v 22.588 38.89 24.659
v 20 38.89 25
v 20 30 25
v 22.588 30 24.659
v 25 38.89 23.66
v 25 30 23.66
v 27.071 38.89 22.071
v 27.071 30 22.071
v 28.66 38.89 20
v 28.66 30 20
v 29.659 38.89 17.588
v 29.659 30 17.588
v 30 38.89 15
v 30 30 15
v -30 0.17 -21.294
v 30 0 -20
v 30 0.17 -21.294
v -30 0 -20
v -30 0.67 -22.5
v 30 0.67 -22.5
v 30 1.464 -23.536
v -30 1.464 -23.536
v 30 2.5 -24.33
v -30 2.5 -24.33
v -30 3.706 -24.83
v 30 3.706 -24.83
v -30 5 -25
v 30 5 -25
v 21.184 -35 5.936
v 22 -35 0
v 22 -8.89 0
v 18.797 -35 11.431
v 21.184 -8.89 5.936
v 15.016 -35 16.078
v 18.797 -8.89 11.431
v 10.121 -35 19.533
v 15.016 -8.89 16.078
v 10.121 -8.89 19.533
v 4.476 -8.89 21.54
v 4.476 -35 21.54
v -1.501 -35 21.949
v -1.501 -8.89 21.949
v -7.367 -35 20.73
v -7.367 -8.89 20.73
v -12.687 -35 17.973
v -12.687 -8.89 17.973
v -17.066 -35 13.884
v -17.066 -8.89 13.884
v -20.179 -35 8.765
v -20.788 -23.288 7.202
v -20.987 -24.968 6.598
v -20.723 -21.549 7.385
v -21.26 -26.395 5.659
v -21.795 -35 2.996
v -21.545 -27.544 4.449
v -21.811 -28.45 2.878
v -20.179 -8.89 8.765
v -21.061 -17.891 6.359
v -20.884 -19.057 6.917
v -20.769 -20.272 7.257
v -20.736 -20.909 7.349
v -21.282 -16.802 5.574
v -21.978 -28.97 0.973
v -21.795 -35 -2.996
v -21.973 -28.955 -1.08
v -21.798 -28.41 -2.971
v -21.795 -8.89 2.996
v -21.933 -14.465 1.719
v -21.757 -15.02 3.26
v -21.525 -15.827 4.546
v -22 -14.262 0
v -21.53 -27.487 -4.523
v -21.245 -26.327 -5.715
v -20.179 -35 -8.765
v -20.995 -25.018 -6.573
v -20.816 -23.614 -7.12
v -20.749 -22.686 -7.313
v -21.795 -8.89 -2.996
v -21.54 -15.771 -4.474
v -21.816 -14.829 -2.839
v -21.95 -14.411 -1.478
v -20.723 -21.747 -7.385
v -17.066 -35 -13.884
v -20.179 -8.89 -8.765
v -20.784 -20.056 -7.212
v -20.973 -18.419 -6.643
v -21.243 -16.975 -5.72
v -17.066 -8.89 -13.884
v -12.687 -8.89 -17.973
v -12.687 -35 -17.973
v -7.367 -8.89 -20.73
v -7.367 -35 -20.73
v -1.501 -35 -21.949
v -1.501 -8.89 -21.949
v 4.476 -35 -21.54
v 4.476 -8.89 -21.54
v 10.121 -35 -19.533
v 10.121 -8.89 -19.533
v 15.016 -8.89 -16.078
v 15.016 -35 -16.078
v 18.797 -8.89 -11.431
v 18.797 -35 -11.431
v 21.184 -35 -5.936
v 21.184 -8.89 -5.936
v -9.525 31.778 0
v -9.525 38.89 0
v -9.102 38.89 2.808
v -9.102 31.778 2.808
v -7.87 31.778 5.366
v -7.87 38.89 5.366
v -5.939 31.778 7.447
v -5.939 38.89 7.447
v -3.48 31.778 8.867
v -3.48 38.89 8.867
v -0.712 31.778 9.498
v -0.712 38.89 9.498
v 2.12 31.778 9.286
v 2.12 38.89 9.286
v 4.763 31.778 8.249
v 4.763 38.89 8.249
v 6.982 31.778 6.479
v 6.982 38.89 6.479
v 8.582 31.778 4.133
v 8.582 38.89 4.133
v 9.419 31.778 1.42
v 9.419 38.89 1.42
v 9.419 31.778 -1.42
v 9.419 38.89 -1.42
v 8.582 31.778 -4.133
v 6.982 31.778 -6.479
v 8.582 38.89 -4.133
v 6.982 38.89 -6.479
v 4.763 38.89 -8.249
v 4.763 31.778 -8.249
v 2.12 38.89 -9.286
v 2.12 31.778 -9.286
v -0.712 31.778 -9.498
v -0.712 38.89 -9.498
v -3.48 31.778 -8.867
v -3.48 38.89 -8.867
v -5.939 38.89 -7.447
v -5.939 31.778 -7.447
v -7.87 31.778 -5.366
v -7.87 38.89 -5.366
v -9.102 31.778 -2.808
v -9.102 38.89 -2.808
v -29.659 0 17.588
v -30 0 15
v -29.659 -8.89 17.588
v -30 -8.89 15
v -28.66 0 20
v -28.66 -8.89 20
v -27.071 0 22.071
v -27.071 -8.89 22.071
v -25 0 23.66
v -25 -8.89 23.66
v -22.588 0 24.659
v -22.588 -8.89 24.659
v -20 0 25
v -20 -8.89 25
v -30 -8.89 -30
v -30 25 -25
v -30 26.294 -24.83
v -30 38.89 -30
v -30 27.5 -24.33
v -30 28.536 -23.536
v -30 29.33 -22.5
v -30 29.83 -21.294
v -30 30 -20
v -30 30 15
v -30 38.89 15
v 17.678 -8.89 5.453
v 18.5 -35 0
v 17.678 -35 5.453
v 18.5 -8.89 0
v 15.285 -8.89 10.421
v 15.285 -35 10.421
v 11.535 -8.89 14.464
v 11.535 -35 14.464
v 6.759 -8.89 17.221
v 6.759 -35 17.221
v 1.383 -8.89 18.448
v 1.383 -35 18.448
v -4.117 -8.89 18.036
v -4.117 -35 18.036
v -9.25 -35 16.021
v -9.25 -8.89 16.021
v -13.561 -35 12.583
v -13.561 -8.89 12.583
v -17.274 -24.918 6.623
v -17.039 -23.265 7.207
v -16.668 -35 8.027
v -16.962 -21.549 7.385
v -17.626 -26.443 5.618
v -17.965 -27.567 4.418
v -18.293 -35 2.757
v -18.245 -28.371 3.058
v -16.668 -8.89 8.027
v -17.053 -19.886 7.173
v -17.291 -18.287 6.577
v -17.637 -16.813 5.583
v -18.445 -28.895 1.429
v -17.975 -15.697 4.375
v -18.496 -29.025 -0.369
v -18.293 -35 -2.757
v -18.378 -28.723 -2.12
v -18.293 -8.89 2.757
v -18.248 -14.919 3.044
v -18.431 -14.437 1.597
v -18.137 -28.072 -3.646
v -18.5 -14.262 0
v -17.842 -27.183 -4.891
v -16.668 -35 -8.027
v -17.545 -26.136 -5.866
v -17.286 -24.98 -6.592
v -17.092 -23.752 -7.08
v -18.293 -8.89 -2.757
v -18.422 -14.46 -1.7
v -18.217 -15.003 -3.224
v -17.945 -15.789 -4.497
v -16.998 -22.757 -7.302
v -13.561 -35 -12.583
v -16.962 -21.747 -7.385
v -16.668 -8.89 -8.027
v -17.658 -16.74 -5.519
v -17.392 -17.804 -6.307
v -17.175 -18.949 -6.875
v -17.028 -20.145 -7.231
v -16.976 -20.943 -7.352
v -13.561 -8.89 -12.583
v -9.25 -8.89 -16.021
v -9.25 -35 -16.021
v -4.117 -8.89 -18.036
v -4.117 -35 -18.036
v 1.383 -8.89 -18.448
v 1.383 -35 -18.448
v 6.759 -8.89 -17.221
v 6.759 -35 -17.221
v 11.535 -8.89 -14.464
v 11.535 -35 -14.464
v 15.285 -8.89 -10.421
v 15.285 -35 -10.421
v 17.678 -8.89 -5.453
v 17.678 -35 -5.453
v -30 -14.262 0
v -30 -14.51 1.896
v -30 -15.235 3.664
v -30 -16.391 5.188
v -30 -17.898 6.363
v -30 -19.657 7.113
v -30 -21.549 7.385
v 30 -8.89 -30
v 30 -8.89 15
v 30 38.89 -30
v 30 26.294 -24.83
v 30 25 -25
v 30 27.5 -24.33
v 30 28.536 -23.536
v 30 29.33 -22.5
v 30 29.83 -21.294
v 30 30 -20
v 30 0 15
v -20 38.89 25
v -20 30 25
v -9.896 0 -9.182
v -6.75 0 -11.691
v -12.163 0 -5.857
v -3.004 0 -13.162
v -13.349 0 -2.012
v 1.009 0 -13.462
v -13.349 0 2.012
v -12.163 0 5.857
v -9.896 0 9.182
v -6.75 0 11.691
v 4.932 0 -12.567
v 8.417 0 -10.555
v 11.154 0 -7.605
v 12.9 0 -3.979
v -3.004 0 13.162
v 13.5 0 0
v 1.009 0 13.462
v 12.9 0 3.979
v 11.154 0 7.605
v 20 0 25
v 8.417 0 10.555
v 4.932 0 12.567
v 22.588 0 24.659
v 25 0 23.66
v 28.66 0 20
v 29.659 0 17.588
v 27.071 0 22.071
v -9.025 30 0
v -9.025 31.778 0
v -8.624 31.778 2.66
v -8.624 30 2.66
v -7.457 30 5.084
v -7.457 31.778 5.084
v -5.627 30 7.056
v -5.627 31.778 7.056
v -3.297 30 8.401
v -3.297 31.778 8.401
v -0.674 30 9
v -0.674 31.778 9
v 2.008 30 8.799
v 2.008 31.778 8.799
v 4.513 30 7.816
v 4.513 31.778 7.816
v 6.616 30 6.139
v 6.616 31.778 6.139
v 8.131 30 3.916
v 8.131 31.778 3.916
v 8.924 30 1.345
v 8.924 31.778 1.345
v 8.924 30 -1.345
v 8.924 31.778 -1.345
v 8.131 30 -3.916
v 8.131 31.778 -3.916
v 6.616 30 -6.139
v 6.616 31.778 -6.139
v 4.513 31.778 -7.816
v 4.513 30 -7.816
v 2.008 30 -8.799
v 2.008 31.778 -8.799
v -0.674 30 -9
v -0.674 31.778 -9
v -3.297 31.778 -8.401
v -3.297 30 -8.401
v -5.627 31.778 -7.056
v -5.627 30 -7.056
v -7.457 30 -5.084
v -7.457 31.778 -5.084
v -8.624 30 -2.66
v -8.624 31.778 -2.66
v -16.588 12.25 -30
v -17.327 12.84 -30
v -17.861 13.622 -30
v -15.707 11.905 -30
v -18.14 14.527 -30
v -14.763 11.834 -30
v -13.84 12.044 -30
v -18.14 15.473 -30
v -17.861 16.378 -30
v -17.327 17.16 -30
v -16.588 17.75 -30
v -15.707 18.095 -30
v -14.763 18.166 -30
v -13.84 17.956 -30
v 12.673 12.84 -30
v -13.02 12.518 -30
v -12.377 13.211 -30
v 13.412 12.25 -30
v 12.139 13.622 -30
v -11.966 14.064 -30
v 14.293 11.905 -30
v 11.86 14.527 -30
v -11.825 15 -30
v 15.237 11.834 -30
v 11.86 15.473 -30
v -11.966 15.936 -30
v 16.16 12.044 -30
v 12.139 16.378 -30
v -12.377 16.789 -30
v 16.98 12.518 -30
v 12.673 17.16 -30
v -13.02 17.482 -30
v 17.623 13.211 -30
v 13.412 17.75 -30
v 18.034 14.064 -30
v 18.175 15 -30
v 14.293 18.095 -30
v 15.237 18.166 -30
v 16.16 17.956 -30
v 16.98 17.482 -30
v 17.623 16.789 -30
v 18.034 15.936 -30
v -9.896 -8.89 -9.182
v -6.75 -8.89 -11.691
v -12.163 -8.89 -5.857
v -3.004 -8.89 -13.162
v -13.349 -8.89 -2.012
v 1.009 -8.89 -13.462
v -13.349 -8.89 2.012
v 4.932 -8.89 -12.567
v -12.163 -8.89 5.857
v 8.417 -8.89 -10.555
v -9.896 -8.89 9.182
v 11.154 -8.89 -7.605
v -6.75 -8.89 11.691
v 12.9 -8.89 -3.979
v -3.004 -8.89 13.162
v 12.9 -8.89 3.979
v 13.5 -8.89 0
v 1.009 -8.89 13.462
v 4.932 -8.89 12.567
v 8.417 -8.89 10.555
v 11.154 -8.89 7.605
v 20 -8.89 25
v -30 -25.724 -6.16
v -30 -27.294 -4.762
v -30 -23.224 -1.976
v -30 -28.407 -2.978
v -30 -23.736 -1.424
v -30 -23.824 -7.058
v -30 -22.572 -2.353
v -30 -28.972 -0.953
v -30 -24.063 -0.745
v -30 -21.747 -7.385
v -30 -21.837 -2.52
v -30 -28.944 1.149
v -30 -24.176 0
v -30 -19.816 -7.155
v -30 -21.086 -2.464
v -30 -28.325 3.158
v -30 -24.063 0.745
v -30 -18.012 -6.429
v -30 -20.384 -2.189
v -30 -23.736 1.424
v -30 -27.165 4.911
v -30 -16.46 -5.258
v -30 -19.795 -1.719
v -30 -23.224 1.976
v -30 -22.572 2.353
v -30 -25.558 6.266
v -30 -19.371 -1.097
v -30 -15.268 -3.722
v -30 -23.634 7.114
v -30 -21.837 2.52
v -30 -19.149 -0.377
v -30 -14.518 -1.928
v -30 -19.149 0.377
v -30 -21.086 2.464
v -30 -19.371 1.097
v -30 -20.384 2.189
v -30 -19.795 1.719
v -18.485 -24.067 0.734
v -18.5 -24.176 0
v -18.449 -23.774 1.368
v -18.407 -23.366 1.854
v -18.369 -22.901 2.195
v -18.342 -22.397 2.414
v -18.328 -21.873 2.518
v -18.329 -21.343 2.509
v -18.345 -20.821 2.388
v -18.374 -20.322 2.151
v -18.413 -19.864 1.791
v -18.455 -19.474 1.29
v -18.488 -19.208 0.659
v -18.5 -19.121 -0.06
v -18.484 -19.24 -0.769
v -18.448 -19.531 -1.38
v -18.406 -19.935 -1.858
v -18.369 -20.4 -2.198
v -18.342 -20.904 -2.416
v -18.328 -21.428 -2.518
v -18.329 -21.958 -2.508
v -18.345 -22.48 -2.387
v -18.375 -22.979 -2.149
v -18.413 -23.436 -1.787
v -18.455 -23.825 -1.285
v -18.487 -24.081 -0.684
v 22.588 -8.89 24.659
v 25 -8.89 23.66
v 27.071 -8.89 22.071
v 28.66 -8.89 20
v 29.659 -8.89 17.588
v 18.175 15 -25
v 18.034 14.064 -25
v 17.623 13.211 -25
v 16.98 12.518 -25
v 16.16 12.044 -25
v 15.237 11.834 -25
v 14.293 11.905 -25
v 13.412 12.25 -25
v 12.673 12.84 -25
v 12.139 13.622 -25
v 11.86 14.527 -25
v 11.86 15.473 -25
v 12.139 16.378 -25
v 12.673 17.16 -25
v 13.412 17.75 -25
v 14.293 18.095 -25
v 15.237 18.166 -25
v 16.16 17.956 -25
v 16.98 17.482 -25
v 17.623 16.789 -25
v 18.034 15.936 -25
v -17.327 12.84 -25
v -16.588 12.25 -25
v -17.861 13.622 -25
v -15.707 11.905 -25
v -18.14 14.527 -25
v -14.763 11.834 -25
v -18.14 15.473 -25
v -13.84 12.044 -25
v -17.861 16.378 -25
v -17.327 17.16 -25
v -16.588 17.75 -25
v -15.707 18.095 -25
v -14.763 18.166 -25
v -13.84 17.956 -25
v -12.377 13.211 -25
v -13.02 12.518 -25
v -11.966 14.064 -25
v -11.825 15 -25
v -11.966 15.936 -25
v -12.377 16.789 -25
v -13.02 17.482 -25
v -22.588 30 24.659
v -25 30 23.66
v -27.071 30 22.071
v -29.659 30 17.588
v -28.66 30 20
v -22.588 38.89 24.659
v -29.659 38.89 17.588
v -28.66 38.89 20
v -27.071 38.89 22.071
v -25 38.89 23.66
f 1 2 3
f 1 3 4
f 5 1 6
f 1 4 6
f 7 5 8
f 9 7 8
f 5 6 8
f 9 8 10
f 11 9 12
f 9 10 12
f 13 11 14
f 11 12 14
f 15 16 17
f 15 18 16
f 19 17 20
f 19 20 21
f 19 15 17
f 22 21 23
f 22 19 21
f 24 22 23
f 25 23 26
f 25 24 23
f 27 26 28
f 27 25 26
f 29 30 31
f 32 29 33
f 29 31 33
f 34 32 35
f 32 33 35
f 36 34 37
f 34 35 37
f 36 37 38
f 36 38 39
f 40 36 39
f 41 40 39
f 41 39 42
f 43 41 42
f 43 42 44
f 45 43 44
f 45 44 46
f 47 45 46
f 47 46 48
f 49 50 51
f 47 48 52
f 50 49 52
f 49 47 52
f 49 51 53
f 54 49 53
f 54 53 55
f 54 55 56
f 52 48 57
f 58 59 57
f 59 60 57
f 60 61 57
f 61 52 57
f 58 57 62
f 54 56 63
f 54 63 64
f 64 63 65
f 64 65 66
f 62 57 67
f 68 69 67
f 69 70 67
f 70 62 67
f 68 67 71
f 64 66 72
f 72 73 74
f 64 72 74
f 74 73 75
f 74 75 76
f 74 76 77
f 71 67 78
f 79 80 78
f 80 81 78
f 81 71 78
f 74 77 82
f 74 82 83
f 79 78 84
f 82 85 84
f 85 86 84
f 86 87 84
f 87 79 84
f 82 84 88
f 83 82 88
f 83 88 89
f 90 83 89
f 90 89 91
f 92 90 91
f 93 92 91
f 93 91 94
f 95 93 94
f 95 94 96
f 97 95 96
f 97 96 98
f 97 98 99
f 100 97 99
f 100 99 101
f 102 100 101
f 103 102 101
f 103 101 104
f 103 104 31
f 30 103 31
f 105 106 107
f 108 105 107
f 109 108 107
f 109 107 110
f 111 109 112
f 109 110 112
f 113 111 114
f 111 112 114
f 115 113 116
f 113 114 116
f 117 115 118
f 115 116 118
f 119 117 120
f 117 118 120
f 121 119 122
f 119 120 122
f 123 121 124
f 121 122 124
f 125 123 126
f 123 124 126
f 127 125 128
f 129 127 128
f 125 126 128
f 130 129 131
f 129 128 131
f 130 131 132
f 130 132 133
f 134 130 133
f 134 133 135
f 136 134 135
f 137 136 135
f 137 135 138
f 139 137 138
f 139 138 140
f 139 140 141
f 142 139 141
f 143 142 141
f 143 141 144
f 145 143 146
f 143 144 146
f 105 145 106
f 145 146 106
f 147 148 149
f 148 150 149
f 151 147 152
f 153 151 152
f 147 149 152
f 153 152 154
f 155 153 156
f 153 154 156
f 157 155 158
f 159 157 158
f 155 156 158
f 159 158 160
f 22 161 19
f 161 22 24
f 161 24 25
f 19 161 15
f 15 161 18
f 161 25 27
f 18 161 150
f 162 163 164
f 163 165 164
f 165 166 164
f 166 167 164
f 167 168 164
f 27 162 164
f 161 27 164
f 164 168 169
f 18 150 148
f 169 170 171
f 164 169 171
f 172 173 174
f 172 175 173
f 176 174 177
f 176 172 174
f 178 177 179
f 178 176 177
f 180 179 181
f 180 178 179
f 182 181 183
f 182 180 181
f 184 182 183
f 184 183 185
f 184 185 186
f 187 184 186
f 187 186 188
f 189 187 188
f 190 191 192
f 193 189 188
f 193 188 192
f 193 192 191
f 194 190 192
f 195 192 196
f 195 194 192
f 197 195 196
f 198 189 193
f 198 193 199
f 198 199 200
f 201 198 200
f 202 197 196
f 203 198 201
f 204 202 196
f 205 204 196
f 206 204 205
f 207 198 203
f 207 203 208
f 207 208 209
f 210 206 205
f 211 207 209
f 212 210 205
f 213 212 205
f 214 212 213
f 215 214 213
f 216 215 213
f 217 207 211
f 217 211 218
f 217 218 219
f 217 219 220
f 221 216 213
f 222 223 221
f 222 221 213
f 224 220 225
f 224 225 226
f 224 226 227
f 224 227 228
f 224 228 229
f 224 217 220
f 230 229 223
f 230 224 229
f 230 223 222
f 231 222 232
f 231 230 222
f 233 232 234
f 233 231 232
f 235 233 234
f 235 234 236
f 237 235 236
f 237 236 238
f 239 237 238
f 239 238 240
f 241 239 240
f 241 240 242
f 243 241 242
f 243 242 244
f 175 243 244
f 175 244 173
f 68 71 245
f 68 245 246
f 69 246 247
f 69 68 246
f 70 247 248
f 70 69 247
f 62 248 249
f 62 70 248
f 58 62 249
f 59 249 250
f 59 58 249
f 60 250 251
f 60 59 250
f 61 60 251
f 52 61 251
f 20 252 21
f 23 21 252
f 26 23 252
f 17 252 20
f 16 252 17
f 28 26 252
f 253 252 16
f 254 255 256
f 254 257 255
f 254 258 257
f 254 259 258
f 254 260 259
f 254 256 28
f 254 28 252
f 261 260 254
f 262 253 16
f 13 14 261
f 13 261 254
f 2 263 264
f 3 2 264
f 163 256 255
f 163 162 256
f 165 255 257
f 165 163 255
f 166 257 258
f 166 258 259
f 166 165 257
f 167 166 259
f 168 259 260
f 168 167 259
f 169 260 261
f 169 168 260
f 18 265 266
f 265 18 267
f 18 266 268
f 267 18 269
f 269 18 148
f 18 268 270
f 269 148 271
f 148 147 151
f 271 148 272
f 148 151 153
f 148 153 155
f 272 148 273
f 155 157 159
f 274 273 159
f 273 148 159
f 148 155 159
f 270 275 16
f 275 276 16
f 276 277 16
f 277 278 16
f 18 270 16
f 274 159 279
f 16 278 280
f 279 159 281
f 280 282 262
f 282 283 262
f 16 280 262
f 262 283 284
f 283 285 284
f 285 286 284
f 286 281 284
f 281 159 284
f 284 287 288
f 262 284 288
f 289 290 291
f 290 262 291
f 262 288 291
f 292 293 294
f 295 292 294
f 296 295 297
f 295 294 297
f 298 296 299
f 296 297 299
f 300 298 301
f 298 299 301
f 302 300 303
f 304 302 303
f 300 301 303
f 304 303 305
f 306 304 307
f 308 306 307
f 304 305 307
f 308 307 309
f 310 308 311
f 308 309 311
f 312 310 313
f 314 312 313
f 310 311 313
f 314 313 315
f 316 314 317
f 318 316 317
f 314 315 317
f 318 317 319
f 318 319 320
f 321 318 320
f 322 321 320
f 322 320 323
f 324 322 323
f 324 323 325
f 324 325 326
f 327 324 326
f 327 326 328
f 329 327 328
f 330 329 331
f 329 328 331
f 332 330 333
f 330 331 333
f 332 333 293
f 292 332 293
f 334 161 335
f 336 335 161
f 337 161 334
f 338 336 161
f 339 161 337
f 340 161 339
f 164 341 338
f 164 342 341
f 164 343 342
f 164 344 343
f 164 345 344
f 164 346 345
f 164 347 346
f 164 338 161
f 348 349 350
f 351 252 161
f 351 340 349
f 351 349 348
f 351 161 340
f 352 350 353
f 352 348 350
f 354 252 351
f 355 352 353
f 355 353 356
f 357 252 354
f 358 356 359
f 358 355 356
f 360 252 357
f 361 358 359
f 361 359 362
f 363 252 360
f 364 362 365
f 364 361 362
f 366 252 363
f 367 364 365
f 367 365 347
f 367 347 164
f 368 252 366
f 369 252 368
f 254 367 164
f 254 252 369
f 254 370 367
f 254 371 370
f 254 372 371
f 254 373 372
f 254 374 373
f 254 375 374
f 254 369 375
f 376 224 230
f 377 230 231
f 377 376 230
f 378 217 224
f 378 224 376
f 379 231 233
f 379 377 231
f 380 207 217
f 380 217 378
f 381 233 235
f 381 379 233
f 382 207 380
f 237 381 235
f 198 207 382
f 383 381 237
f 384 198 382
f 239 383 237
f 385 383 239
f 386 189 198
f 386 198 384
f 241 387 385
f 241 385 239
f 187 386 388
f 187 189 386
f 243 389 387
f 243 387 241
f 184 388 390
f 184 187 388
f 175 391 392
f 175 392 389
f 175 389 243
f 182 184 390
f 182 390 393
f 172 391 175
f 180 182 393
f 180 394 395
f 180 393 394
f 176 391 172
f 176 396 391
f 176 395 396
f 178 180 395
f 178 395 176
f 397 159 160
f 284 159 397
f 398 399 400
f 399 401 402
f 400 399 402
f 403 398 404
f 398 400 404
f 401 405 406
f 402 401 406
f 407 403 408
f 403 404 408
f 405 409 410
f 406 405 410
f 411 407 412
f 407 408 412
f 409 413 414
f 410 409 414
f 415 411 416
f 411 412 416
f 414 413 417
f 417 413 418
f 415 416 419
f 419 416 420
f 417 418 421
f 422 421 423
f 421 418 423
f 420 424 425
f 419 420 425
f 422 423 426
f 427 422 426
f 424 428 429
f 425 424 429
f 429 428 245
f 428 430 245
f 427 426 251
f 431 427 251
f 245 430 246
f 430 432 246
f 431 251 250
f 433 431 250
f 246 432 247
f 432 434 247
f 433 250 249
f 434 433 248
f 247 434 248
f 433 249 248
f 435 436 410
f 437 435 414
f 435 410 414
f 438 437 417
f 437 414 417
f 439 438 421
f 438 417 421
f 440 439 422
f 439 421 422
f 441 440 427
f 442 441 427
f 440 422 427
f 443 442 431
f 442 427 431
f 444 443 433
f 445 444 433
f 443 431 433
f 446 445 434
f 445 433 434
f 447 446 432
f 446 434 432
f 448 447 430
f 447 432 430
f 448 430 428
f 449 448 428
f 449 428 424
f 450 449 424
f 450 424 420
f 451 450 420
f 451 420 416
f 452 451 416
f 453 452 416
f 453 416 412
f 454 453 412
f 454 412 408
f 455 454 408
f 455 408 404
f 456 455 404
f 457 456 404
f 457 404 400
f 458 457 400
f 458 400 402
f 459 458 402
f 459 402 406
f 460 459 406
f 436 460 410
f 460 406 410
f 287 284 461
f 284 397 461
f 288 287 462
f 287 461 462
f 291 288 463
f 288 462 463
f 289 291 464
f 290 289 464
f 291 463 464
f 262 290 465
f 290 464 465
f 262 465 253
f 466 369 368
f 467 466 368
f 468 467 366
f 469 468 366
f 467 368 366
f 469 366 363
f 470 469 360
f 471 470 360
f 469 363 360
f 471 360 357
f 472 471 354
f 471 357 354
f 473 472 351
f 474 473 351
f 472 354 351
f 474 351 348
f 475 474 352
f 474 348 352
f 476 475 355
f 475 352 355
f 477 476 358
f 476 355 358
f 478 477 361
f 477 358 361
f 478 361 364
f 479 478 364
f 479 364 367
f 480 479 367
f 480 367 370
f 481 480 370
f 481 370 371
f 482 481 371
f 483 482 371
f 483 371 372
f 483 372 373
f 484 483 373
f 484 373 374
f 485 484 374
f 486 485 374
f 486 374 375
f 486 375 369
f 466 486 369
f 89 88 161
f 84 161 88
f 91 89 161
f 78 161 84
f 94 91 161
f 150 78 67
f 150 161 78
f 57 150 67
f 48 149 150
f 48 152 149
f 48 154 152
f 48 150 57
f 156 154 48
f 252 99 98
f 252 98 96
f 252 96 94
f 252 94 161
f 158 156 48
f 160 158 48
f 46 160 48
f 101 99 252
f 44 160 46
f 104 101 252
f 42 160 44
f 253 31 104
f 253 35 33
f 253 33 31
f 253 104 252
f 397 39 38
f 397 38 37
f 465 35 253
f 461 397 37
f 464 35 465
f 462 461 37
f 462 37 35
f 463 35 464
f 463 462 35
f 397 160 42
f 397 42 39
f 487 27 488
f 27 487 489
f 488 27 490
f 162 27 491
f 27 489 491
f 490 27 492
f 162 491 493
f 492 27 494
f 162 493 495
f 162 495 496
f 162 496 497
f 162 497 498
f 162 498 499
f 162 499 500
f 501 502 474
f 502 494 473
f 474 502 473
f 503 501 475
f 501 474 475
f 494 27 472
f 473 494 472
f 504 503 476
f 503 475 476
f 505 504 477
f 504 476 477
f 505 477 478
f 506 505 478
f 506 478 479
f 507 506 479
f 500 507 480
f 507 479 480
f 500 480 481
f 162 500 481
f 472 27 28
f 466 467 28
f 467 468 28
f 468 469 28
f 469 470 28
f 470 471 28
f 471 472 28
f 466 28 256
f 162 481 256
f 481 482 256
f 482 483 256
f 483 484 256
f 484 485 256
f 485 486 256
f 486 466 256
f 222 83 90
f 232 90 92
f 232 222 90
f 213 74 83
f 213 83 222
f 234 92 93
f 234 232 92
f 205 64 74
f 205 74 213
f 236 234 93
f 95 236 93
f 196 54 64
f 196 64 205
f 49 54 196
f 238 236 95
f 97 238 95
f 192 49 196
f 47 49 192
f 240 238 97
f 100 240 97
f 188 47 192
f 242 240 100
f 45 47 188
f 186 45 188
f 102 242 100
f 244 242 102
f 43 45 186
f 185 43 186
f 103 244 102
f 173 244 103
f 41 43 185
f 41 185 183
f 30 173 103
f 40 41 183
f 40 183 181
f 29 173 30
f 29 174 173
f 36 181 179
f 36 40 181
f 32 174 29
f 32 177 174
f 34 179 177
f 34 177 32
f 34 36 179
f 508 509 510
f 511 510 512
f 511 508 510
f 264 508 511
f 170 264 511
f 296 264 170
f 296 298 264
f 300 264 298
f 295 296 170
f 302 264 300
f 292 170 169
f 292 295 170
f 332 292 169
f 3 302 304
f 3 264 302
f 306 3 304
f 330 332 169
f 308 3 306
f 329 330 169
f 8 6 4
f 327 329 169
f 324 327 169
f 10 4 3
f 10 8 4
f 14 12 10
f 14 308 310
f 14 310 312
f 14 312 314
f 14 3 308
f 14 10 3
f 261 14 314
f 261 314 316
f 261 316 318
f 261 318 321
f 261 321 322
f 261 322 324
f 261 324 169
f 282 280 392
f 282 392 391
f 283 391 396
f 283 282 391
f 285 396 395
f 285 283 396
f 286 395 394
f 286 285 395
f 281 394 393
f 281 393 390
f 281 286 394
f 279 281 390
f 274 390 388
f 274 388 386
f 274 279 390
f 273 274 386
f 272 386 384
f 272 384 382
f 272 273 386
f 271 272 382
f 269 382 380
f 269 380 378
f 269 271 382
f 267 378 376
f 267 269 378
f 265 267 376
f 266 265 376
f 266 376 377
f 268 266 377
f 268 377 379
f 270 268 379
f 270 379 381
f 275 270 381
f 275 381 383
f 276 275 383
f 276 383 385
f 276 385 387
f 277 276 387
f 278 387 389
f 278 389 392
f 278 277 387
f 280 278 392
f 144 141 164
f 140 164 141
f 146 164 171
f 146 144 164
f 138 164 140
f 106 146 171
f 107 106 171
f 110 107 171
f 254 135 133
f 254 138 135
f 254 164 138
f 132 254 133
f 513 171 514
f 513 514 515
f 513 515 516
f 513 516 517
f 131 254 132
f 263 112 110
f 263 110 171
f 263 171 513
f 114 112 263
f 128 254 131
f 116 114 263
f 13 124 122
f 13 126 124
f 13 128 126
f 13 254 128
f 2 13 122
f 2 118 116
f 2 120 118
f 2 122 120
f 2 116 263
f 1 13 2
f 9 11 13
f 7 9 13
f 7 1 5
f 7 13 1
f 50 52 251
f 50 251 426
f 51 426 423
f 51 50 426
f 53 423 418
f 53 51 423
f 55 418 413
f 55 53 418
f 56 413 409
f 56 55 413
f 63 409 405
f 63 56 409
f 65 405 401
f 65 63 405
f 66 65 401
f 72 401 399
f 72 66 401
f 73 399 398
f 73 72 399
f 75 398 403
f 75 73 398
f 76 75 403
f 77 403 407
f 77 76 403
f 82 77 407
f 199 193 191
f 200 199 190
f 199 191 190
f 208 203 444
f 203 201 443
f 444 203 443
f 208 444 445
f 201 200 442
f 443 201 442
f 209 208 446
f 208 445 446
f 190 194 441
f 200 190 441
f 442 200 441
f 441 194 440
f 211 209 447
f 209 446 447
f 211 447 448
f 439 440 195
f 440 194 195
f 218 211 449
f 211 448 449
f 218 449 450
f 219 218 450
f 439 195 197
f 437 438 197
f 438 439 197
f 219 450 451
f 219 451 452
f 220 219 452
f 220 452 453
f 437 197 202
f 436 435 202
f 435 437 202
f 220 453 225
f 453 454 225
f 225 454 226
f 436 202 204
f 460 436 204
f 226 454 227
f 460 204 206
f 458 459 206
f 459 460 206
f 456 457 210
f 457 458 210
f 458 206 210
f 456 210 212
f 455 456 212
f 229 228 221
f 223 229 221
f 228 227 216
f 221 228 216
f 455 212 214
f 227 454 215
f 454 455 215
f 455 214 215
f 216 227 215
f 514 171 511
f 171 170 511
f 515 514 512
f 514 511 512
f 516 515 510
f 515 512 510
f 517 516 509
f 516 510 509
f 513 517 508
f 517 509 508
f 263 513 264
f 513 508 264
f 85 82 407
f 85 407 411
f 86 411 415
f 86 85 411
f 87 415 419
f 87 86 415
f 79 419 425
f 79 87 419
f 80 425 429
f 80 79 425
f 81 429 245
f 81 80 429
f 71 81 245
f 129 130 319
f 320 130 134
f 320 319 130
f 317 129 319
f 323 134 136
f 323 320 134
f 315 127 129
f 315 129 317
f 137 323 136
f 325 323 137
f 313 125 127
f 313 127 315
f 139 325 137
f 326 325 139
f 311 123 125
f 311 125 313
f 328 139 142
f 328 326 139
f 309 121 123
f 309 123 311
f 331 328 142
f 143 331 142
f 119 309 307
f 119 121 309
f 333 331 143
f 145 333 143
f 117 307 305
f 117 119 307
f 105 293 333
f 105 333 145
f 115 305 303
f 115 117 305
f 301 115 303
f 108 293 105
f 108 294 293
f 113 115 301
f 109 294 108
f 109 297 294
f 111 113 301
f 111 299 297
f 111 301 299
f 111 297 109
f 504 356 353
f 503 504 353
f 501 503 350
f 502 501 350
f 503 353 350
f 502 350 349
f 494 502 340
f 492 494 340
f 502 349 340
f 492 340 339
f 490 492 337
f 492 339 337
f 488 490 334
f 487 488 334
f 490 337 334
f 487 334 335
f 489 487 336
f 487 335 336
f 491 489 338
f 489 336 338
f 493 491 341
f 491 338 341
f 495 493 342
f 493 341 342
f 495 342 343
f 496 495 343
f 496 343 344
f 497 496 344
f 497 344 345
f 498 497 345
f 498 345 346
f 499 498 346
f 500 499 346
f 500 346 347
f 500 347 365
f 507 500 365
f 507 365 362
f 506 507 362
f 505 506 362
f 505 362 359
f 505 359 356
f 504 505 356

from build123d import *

# Parameters (mm, degrees)
F0_W      = 60
F0_H      = 50
F0_R      = 22
F0_R_2    = 18.5
F0_R_3    = 13.5
F0_H_2    = 5
F1_DEPTH  = 8.89
F2_DEPTH  = 35
F3_W      = 30
F3_H      = 5
F4_DEPTH  = 60
F5_R      = 5
F6_R      = 9.025
F7_DEPTH  = 7.112
F8_DEPTH  = 25
F6_R_2    = 9.525
F9_DEPTH  = 7.112
F10_R     = 10
F12_DEPTH = 30
F13_R     = 18.5
F14_DEPTH = 22
F15_R     = 2.5275
F16_DEPTH = 13
F17_R     = 3.175
F18_DEPTH = 25


with BuildPart() as f1:
    # F0 (on Front) → F1 (new body)
    with BuildSketch(Plane.XZ):
        Rectangle(F0_W, F0_H)
        Circle(F0_R, mode=Mode.SUBTRACT)
        Circle(F0_R)
        Circle(F0_R_2, mode=Mode.SUBTRACT)
        Circle(F0_R_2)
        Circle(F0_R_3, mode=Mode.SUBTRACT)
        with Locations((0, -27.5)):
            Rectangle(F0_W, F0_H_2)
    extrude(amount=F1_DEPTH)

    # F0 (on Front) → F2 (join)
    with BuildSketch(Plane.XZ):
        Circle(F0_R)
        Circle(F0_R_2, mode=Mode.SUBTRACT)
    extrude(amount=F2_DEPTH)

    # F3 (on face) → F4 (join)
    with BuildSketch(Plane.YZ.offset(30)):
        Polygon((30, -25), (30, -30), (38.89, -30), (38.89, 25), (30, 25), align=None)
        with Locations((15, -27.5)):
            Rectangle(F3_W, F3_H)
    extrude(amount=-F4_DEPTH)

    # F5
    f5_edges = [f1.edges().sort_by_distance(p)[0] for p in [
        (0, 30, -25),
        (0, 0, -25),
    ]]
    fillet(f5_edges, radius=F5_R)

    # F6 (on face) → F7 (cut)
    with BuildSketch(Plane(origin=(0, 38.89, 0), x_dir=(-1, 0, 0), z_dir=(0, 1, 0))):
        Circle(F6_R)
    extrude(amount=-F7_DEPTH, mode=Mode.SUBTRACT)

    # F6 (on face) → F8 (cut)
    with BuildSketch(Plane(origin=(0, 38.89, 0), x_dir=(-1, 0, 0), z_dir=(0, 1, 0))):
        Circle(F6_R)
    extrude(amount=-F8_DEPTH, mode=Mode.SUBTRACT)

    # F6 (on face) → F9 (cut)
    with BuildSketch(Plane(origin=(0, 38.89, 0), x_dir=(-1, 0, 0), z_dir=(0, 1, 0))):
        Circle(F6_R_2)
        Circle(F6_R, mode=Mode.SUBTRACT)
    extrude(amount=-F9_DEPTH, mode=Mode.SUBTRACT)

    # F10
    f10_edges = [f1.edges().sort_by_distance(p)[0] for p in [
        (30, -4.445, 25),
        (30, 34.445, 25),
        (-30, -4.445, 25),
        (-30, 34.445, 25),
    ]]
    fillet(f10_edges, radius=F10_R)

    # F11 (on Right) → F12 (join)
    with BuildSketch(Plane.YZ):
        with BuildLine():
            ThreePointArc((-21.5492570434, 7.385385089), (-29.0335155473, 0.0988734149), (-21.7470038732, -7.385385089))
            Line((-21.7470038732, -7.385385089), (-21.5492570434, 7.385385089))
        make_face()
        with BuildLine():
            Line((-21.5492570434, 7.385385089), (-21.7470038732, -7.385385089))
            ThreePointArc((-21.7470038732, -7.385385089), (-16.4604814154, -5.2575646712), (-14.2620835546, 0))
            ThreePointArc((-14.2620835546, 0), (-16.3905657871, 5.1876490429), (-21.5492570434, 7.385385089))
        make_face()
    extrude(amount=-F12_DEPTH)

    # F13 (on face) → F14 (cut)
    with BuildSketch(Plane.XZ.offset(35)):
        Circle(F13_R)
    extrude(amount=-F14_DEPTH, mode=Mode.SUBTRACT)

    # F15 (on face) → F16 (cut)
    with BuildSketch(Plane(origin=(-30, 0, 0), x_dir=(0, -1, 0), z_dir=(-1, 0, 0))):
        with Locations((21.6481304583, 0)):
            Circle(F15_R)
    extrude(amount=-F16_DEPTH, mode=Mode.SUBTRACT)

    # F17 (on face) → F18 (cut)
    with BuildSketch(Plane(origin=(0, 0, -30), x_dir=(1, 0, 0), z_dir=(0, 0, -1))):
        with Locations((-15, -15)):
            Circle(F17_R)
        with Locations((15, -15)):
            Circle(F17_R)
    extrude(amount=-F18_DEPTH, mode=Mode.SUBTRACT)


solid = f1.part
